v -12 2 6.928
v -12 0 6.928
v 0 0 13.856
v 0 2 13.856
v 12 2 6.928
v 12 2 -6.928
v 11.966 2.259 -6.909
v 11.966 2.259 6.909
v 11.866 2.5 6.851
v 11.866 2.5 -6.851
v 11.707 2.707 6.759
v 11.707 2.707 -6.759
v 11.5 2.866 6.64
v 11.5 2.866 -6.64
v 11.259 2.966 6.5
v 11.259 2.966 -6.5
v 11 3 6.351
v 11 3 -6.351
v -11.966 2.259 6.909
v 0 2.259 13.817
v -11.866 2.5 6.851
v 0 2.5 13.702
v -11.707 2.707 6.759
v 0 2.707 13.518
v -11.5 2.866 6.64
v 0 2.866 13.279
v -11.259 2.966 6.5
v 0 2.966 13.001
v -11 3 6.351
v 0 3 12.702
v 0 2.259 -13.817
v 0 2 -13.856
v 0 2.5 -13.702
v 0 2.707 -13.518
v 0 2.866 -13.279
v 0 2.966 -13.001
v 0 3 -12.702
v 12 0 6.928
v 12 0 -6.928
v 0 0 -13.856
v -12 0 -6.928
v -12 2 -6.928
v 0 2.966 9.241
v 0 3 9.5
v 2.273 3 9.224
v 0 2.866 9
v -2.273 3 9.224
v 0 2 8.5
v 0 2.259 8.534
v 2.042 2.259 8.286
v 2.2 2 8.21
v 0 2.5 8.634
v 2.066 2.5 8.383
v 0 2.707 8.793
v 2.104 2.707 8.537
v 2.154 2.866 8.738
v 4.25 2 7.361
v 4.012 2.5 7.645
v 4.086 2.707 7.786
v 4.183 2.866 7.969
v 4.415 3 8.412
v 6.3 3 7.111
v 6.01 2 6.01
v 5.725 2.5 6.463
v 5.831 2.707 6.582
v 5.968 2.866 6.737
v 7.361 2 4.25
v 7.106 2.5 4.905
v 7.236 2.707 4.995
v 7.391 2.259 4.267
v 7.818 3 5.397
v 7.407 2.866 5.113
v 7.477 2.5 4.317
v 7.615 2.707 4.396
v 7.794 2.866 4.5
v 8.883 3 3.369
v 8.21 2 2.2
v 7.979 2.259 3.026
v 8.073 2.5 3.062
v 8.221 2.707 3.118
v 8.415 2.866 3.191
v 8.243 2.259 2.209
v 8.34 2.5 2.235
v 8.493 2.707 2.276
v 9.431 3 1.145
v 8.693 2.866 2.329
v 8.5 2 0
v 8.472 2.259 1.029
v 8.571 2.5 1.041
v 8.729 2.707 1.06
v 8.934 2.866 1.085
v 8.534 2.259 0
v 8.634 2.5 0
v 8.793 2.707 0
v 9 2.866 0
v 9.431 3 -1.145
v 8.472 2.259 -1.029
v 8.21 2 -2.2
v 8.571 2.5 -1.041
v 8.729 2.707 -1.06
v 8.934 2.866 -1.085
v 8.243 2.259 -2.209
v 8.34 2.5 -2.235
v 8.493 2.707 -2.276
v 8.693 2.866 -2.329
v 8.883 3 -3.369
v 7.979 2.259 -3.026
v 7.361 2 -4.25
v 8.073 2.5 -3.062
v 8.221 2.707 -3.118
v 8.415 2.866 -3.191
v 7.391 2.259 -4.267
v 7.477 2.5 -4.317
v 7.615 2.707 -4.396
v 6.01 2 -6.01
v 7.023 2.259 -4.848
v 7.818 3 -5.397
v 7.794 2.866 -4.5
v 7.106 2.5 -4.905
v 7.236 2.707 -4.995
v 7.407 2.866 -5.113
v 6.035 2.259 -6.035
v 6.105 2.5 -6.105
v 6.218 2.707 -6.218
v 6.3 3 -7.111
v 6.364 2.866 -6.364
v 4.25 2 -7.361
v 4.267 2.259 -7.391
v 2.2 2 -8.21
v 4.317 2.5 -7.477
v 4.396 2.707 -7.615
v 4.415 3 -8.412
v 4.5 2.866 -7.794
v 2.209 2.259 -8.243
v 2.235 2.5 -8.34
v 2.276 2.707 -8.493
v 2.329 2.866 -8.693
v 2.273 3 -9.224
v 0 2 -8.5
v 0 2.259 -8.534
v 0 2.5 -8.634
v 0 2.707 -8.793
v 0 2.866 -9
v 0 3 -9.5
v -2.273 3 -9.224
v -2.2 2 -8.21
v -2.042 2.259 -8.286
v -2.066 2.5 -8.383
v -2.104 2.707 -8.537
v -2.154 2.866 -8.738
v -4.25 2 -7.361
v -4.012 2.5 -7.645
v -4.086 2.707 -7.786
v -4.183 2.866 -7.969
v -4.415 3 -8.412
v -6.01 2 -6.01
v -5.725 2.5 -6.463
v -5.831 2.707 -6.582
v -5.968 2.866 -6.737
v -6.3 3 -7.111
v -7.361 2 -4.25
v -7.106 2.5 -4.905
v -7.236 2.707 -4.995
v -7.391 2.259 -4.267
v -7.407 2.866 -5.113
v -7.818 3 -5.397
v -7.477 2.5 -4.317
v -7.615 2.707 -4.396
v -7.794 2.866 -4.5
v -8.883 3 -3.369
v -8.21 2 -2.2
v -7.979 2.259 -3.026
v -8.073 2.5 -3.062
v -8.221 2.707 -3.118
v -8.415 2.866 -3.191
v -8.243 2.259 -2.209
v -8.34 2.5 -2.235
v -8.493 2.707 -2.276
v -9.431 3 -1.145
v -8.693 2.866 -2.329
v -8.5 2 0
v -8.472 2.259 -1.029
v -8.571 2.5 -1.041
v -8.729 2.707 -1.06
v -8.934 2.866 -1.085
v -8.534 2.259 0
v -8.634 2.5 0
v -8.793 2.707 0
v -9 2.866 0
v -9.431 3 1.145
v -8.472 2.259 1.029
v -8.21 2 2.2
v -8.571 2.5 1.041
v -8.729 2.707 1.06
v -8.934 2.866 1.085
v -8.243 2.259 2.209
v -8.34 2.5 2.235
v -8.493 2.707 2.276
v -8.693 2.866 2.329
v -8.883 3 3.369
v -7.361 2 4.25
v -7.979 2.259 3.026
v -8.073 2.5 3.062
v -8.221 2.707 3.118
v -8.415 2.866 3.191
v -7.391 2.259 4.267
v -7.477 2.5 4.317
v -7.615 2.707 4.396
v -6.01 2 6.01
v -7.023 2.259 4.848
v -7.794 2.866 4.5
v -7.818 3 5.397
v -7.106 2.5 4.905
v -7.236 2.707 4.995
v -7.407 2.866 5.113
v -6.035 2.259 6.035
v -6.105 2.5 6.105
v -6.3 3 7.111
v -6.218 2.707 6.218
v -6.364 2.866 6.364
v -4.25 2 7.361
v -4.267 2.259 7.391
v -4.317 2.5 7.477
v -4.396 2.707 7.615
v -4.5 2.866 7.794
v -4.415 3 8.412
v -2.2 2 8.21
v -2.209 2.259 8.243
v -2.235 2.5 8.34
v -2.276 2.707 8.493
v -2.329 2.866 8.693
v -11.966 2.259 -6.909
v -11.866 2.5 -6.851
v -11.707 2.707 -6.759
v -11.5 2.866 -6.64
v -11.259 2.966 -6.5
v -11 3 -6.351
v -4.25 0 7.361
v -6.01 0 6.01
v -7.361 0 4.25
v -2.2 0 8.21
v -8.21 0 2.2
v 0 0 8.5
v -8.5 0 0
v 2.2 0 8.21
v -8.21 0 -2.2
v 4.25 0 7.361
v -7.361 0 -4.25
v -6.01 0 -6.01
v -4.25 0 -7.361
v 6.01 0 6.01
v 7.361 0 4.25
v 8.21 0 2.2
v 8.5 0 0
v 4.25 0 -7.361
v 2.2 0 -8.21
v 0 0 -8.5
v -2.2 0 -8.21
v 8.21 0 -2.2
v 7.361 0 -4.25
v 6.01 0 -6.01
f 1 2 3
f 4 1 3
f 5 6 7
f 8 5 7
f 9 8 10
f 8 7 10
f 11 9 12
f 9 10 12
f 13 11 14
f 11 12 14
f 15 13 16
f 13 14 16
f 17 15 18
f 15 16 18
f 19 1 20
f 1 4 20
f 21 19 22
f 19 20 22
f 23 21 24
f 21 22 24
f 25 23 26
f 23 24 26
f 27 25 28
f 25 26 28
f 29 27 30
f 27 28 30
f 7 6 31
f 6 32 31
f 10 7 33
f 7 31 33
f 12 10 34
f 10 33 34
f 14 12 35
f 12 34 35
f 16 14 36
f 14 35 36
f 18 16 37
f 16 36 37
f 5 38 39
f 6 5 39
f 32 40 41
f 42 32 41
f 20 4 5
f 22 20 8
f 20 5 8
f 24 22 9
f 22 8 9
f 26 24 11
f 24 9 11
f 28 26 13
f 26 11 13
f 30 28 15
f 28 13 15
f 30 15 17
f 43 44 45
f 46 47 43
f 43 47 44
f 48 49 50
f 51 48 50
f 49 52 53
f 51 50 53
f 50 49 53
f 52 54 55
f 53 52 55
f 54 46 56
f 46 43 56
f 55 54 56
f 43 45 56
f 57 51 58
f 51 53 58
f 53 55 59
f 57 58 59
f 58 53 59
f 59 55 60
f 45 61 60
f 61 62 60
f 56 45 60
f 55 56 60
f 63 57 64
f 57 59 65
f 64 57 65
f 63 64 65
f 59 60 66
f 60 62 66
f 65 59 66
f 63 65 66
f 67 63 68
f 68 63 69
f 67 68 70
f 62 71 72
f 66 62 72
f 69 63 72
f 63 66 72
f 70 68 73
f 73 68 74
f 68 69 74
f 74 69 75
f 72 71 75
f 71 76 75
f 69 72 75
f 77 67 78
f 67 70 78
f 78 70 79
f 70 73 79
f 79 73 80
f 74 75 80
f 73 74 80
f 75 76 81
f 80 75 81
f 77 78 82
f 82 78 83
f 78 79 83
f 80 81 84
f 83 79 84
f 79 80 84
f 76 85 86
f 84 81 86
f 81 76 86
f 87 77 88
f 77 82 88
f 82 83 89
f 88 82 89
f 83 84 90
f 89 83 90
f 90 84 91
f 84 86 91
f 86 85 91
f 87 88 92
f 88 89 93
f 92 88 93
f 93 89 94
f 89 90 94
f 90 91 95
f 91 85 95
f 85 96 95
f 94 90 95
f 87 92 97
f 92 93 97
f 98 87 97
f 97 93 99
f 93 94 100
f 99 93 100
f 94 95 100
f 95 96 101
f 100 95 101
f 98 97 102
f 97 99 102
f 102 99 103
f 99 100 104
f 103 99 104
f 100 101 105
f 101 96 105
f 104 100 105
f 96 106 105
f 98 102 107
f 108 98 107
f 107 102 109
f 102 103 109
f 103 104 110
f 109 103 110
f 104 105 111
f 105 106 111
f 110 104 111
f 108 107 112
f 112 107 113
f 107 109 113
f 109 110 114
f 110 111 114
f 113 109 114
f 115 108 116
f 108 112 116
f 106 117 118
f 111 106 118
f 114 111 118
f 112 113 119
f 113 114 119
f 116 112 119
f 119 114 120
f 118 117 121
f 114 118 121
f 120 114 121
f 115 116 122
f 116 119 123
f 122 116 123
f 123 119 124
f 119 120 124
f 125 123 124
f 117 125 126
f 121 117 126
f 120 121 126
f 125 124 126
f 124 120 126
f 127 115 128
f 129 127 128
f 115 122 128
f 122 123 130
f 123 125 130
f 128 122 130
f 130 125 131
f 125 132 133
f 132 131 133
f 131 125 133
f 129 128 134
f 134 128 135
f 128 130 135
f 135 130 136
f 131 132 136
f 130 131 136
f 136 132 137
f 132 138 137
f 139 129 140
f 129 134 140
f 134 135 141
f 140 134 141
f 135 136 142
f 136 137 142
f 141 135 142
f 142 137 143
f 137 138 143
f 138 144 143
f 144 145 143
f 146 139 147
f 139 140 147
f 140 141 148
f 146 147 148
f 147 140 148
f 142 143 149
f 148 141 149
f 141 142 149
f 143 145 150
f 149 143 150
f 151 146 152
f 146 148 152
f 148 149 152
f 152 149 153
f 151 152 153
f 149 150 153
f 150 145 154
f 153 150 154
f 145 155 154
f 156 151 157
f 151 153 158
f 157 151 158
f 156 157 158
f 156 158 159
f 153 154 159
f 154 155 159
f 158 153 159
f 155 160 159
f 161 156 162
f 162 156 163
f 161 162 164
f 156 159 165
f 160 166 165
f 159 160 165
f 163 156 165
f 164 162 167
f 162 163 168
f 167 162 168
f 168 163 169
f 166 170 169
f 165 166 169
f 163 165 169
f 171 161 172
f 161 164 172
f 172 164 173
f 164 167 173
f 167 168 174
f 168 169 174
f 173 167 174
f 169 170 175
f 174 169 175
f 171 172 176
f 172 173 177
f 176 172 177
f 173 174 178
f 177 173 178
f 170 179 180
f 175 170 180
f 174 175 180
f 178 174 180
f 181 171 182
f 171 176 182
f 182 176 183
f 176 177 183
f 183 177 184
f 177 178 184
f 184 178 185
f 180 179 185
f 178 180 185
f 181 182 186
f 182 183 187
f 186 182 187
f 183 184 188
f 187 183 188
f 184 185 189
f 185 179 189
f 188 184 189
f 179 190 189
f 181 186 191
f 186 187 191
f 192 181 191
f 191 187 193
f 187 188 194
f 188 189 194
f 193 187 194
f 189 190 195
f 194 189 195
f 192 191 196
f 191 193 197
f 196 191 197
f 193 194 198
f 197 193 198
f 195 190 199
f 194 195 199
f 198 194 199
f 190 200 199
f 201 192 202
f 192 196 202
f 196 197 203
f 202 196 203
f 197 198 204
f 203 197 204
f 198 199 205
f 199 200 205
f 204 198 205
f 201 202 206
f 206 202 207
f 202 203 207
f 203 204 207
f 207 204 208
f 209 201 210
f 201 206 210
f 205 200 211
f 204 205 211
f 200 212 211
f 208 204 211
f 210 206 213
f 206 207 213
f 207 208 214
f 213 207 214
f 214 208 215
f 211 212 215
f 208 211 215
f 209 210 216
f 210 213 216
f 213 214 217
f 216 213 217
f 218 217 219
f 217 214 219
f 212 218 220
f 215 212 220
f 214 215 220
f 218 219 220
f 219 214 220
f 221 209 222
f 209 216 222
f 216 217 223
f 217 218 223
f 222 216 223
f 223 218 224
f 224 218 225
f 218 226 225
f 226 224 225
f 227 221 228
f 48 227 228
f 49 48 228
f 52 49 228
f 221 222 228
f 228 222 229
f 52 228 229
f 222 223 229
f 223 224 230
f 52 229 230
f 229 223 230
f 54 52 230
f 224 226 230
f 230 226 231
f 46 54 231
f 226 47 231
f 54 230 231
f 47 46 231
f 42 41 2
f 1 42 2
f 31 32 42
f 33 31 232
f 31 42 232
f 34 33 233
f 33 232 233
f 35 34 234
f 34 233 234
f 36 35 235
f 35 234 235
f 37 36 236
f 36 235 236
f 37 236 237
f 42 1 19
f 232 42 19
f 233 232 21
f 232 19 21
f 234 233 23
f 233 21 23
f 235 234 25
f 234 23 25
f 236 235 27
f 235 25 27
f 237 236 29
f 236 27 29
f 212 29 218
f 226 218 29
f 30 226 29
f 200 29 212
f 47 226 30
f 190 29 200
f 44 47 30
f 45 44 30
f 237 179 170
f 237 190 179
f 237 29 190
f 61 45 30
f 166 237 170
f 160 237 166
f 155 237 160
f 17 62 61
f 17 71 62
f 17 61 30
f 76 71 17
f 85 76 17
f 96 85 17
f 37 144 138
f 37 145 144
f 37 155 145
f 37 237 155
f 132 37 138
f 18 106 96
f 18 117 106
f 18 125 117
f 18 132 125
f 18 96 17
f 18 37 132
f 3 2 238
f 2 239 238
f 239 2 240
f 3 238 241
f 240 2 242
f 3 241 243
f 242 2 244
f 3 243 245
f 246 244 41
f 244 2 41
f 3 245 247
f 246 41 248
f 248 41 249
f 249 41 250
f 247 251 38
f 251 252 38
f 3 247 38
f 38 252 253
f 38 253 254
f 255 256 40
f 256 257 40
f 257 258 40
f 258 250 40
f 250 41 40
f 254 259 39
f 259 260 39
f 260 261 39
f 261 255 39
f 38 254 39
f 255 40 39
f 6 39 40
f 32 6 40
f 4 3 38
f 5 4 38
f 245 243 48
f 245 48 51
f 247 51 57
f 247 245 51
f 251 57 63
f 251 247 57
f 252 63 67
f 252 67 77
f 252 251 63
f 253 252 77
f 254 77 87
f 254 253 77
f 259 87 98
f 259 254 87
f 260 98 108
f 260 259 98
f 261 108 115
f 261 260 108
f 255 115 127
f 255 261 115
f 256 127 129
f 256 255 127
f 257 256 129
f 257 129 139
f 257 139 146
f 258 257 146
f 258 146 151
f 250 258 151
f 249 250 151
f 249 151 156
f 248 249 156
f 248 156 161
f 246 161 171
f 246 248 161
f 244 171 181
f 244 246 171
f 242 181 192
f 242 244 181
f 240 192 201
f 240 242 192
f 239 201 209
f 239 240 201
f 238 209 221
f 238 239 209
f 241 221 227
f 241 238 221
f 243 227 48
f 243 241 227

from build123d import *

# Parameters (mm, degrees)
SKETCH_1_R      = 8.5
EXTRUDE_1_DEPTH = 3
FILLET_1_R      = 1


with BuildPart() as part:
    # 草图1 → 凸台-拉伸1 (new body)
    with BuildSketch(Plane(origin=(0, 0, 0), x_dir=(1, 0, 0), z_dir=(0, 1, 0))):
        Polygon((0, 13.856406461), (-12, 6.92820323), (-12, -6.92820323), (0, -13.856406461), (12, -6.92820323), (12, 6.92820323), align=None)
        with Locations(Location((0, 0, 0), (0, 0, 270))):
            Circle(SKETCH_1_R, mode=Mode.SUBTRACT)
    extrude(amount=EXTRUDE_1_DEPTH)

    # 圆角1
    fillet_1_edges = [part.edges().sort_by_distance(p)[0] for p in [
        (-12, 3, 0),
        (-6, 3, 10.392304845),
        (6, 3, 10.392304845),
        (0, 3, -8.5),
        (12, 3, 0),
        (6, 3, -10.392304845),
        (-6, 3, -10.392304845),
    ]]
    fillet(fillet_1_edges, radius=FILLET_1_R)


solid = part.part
